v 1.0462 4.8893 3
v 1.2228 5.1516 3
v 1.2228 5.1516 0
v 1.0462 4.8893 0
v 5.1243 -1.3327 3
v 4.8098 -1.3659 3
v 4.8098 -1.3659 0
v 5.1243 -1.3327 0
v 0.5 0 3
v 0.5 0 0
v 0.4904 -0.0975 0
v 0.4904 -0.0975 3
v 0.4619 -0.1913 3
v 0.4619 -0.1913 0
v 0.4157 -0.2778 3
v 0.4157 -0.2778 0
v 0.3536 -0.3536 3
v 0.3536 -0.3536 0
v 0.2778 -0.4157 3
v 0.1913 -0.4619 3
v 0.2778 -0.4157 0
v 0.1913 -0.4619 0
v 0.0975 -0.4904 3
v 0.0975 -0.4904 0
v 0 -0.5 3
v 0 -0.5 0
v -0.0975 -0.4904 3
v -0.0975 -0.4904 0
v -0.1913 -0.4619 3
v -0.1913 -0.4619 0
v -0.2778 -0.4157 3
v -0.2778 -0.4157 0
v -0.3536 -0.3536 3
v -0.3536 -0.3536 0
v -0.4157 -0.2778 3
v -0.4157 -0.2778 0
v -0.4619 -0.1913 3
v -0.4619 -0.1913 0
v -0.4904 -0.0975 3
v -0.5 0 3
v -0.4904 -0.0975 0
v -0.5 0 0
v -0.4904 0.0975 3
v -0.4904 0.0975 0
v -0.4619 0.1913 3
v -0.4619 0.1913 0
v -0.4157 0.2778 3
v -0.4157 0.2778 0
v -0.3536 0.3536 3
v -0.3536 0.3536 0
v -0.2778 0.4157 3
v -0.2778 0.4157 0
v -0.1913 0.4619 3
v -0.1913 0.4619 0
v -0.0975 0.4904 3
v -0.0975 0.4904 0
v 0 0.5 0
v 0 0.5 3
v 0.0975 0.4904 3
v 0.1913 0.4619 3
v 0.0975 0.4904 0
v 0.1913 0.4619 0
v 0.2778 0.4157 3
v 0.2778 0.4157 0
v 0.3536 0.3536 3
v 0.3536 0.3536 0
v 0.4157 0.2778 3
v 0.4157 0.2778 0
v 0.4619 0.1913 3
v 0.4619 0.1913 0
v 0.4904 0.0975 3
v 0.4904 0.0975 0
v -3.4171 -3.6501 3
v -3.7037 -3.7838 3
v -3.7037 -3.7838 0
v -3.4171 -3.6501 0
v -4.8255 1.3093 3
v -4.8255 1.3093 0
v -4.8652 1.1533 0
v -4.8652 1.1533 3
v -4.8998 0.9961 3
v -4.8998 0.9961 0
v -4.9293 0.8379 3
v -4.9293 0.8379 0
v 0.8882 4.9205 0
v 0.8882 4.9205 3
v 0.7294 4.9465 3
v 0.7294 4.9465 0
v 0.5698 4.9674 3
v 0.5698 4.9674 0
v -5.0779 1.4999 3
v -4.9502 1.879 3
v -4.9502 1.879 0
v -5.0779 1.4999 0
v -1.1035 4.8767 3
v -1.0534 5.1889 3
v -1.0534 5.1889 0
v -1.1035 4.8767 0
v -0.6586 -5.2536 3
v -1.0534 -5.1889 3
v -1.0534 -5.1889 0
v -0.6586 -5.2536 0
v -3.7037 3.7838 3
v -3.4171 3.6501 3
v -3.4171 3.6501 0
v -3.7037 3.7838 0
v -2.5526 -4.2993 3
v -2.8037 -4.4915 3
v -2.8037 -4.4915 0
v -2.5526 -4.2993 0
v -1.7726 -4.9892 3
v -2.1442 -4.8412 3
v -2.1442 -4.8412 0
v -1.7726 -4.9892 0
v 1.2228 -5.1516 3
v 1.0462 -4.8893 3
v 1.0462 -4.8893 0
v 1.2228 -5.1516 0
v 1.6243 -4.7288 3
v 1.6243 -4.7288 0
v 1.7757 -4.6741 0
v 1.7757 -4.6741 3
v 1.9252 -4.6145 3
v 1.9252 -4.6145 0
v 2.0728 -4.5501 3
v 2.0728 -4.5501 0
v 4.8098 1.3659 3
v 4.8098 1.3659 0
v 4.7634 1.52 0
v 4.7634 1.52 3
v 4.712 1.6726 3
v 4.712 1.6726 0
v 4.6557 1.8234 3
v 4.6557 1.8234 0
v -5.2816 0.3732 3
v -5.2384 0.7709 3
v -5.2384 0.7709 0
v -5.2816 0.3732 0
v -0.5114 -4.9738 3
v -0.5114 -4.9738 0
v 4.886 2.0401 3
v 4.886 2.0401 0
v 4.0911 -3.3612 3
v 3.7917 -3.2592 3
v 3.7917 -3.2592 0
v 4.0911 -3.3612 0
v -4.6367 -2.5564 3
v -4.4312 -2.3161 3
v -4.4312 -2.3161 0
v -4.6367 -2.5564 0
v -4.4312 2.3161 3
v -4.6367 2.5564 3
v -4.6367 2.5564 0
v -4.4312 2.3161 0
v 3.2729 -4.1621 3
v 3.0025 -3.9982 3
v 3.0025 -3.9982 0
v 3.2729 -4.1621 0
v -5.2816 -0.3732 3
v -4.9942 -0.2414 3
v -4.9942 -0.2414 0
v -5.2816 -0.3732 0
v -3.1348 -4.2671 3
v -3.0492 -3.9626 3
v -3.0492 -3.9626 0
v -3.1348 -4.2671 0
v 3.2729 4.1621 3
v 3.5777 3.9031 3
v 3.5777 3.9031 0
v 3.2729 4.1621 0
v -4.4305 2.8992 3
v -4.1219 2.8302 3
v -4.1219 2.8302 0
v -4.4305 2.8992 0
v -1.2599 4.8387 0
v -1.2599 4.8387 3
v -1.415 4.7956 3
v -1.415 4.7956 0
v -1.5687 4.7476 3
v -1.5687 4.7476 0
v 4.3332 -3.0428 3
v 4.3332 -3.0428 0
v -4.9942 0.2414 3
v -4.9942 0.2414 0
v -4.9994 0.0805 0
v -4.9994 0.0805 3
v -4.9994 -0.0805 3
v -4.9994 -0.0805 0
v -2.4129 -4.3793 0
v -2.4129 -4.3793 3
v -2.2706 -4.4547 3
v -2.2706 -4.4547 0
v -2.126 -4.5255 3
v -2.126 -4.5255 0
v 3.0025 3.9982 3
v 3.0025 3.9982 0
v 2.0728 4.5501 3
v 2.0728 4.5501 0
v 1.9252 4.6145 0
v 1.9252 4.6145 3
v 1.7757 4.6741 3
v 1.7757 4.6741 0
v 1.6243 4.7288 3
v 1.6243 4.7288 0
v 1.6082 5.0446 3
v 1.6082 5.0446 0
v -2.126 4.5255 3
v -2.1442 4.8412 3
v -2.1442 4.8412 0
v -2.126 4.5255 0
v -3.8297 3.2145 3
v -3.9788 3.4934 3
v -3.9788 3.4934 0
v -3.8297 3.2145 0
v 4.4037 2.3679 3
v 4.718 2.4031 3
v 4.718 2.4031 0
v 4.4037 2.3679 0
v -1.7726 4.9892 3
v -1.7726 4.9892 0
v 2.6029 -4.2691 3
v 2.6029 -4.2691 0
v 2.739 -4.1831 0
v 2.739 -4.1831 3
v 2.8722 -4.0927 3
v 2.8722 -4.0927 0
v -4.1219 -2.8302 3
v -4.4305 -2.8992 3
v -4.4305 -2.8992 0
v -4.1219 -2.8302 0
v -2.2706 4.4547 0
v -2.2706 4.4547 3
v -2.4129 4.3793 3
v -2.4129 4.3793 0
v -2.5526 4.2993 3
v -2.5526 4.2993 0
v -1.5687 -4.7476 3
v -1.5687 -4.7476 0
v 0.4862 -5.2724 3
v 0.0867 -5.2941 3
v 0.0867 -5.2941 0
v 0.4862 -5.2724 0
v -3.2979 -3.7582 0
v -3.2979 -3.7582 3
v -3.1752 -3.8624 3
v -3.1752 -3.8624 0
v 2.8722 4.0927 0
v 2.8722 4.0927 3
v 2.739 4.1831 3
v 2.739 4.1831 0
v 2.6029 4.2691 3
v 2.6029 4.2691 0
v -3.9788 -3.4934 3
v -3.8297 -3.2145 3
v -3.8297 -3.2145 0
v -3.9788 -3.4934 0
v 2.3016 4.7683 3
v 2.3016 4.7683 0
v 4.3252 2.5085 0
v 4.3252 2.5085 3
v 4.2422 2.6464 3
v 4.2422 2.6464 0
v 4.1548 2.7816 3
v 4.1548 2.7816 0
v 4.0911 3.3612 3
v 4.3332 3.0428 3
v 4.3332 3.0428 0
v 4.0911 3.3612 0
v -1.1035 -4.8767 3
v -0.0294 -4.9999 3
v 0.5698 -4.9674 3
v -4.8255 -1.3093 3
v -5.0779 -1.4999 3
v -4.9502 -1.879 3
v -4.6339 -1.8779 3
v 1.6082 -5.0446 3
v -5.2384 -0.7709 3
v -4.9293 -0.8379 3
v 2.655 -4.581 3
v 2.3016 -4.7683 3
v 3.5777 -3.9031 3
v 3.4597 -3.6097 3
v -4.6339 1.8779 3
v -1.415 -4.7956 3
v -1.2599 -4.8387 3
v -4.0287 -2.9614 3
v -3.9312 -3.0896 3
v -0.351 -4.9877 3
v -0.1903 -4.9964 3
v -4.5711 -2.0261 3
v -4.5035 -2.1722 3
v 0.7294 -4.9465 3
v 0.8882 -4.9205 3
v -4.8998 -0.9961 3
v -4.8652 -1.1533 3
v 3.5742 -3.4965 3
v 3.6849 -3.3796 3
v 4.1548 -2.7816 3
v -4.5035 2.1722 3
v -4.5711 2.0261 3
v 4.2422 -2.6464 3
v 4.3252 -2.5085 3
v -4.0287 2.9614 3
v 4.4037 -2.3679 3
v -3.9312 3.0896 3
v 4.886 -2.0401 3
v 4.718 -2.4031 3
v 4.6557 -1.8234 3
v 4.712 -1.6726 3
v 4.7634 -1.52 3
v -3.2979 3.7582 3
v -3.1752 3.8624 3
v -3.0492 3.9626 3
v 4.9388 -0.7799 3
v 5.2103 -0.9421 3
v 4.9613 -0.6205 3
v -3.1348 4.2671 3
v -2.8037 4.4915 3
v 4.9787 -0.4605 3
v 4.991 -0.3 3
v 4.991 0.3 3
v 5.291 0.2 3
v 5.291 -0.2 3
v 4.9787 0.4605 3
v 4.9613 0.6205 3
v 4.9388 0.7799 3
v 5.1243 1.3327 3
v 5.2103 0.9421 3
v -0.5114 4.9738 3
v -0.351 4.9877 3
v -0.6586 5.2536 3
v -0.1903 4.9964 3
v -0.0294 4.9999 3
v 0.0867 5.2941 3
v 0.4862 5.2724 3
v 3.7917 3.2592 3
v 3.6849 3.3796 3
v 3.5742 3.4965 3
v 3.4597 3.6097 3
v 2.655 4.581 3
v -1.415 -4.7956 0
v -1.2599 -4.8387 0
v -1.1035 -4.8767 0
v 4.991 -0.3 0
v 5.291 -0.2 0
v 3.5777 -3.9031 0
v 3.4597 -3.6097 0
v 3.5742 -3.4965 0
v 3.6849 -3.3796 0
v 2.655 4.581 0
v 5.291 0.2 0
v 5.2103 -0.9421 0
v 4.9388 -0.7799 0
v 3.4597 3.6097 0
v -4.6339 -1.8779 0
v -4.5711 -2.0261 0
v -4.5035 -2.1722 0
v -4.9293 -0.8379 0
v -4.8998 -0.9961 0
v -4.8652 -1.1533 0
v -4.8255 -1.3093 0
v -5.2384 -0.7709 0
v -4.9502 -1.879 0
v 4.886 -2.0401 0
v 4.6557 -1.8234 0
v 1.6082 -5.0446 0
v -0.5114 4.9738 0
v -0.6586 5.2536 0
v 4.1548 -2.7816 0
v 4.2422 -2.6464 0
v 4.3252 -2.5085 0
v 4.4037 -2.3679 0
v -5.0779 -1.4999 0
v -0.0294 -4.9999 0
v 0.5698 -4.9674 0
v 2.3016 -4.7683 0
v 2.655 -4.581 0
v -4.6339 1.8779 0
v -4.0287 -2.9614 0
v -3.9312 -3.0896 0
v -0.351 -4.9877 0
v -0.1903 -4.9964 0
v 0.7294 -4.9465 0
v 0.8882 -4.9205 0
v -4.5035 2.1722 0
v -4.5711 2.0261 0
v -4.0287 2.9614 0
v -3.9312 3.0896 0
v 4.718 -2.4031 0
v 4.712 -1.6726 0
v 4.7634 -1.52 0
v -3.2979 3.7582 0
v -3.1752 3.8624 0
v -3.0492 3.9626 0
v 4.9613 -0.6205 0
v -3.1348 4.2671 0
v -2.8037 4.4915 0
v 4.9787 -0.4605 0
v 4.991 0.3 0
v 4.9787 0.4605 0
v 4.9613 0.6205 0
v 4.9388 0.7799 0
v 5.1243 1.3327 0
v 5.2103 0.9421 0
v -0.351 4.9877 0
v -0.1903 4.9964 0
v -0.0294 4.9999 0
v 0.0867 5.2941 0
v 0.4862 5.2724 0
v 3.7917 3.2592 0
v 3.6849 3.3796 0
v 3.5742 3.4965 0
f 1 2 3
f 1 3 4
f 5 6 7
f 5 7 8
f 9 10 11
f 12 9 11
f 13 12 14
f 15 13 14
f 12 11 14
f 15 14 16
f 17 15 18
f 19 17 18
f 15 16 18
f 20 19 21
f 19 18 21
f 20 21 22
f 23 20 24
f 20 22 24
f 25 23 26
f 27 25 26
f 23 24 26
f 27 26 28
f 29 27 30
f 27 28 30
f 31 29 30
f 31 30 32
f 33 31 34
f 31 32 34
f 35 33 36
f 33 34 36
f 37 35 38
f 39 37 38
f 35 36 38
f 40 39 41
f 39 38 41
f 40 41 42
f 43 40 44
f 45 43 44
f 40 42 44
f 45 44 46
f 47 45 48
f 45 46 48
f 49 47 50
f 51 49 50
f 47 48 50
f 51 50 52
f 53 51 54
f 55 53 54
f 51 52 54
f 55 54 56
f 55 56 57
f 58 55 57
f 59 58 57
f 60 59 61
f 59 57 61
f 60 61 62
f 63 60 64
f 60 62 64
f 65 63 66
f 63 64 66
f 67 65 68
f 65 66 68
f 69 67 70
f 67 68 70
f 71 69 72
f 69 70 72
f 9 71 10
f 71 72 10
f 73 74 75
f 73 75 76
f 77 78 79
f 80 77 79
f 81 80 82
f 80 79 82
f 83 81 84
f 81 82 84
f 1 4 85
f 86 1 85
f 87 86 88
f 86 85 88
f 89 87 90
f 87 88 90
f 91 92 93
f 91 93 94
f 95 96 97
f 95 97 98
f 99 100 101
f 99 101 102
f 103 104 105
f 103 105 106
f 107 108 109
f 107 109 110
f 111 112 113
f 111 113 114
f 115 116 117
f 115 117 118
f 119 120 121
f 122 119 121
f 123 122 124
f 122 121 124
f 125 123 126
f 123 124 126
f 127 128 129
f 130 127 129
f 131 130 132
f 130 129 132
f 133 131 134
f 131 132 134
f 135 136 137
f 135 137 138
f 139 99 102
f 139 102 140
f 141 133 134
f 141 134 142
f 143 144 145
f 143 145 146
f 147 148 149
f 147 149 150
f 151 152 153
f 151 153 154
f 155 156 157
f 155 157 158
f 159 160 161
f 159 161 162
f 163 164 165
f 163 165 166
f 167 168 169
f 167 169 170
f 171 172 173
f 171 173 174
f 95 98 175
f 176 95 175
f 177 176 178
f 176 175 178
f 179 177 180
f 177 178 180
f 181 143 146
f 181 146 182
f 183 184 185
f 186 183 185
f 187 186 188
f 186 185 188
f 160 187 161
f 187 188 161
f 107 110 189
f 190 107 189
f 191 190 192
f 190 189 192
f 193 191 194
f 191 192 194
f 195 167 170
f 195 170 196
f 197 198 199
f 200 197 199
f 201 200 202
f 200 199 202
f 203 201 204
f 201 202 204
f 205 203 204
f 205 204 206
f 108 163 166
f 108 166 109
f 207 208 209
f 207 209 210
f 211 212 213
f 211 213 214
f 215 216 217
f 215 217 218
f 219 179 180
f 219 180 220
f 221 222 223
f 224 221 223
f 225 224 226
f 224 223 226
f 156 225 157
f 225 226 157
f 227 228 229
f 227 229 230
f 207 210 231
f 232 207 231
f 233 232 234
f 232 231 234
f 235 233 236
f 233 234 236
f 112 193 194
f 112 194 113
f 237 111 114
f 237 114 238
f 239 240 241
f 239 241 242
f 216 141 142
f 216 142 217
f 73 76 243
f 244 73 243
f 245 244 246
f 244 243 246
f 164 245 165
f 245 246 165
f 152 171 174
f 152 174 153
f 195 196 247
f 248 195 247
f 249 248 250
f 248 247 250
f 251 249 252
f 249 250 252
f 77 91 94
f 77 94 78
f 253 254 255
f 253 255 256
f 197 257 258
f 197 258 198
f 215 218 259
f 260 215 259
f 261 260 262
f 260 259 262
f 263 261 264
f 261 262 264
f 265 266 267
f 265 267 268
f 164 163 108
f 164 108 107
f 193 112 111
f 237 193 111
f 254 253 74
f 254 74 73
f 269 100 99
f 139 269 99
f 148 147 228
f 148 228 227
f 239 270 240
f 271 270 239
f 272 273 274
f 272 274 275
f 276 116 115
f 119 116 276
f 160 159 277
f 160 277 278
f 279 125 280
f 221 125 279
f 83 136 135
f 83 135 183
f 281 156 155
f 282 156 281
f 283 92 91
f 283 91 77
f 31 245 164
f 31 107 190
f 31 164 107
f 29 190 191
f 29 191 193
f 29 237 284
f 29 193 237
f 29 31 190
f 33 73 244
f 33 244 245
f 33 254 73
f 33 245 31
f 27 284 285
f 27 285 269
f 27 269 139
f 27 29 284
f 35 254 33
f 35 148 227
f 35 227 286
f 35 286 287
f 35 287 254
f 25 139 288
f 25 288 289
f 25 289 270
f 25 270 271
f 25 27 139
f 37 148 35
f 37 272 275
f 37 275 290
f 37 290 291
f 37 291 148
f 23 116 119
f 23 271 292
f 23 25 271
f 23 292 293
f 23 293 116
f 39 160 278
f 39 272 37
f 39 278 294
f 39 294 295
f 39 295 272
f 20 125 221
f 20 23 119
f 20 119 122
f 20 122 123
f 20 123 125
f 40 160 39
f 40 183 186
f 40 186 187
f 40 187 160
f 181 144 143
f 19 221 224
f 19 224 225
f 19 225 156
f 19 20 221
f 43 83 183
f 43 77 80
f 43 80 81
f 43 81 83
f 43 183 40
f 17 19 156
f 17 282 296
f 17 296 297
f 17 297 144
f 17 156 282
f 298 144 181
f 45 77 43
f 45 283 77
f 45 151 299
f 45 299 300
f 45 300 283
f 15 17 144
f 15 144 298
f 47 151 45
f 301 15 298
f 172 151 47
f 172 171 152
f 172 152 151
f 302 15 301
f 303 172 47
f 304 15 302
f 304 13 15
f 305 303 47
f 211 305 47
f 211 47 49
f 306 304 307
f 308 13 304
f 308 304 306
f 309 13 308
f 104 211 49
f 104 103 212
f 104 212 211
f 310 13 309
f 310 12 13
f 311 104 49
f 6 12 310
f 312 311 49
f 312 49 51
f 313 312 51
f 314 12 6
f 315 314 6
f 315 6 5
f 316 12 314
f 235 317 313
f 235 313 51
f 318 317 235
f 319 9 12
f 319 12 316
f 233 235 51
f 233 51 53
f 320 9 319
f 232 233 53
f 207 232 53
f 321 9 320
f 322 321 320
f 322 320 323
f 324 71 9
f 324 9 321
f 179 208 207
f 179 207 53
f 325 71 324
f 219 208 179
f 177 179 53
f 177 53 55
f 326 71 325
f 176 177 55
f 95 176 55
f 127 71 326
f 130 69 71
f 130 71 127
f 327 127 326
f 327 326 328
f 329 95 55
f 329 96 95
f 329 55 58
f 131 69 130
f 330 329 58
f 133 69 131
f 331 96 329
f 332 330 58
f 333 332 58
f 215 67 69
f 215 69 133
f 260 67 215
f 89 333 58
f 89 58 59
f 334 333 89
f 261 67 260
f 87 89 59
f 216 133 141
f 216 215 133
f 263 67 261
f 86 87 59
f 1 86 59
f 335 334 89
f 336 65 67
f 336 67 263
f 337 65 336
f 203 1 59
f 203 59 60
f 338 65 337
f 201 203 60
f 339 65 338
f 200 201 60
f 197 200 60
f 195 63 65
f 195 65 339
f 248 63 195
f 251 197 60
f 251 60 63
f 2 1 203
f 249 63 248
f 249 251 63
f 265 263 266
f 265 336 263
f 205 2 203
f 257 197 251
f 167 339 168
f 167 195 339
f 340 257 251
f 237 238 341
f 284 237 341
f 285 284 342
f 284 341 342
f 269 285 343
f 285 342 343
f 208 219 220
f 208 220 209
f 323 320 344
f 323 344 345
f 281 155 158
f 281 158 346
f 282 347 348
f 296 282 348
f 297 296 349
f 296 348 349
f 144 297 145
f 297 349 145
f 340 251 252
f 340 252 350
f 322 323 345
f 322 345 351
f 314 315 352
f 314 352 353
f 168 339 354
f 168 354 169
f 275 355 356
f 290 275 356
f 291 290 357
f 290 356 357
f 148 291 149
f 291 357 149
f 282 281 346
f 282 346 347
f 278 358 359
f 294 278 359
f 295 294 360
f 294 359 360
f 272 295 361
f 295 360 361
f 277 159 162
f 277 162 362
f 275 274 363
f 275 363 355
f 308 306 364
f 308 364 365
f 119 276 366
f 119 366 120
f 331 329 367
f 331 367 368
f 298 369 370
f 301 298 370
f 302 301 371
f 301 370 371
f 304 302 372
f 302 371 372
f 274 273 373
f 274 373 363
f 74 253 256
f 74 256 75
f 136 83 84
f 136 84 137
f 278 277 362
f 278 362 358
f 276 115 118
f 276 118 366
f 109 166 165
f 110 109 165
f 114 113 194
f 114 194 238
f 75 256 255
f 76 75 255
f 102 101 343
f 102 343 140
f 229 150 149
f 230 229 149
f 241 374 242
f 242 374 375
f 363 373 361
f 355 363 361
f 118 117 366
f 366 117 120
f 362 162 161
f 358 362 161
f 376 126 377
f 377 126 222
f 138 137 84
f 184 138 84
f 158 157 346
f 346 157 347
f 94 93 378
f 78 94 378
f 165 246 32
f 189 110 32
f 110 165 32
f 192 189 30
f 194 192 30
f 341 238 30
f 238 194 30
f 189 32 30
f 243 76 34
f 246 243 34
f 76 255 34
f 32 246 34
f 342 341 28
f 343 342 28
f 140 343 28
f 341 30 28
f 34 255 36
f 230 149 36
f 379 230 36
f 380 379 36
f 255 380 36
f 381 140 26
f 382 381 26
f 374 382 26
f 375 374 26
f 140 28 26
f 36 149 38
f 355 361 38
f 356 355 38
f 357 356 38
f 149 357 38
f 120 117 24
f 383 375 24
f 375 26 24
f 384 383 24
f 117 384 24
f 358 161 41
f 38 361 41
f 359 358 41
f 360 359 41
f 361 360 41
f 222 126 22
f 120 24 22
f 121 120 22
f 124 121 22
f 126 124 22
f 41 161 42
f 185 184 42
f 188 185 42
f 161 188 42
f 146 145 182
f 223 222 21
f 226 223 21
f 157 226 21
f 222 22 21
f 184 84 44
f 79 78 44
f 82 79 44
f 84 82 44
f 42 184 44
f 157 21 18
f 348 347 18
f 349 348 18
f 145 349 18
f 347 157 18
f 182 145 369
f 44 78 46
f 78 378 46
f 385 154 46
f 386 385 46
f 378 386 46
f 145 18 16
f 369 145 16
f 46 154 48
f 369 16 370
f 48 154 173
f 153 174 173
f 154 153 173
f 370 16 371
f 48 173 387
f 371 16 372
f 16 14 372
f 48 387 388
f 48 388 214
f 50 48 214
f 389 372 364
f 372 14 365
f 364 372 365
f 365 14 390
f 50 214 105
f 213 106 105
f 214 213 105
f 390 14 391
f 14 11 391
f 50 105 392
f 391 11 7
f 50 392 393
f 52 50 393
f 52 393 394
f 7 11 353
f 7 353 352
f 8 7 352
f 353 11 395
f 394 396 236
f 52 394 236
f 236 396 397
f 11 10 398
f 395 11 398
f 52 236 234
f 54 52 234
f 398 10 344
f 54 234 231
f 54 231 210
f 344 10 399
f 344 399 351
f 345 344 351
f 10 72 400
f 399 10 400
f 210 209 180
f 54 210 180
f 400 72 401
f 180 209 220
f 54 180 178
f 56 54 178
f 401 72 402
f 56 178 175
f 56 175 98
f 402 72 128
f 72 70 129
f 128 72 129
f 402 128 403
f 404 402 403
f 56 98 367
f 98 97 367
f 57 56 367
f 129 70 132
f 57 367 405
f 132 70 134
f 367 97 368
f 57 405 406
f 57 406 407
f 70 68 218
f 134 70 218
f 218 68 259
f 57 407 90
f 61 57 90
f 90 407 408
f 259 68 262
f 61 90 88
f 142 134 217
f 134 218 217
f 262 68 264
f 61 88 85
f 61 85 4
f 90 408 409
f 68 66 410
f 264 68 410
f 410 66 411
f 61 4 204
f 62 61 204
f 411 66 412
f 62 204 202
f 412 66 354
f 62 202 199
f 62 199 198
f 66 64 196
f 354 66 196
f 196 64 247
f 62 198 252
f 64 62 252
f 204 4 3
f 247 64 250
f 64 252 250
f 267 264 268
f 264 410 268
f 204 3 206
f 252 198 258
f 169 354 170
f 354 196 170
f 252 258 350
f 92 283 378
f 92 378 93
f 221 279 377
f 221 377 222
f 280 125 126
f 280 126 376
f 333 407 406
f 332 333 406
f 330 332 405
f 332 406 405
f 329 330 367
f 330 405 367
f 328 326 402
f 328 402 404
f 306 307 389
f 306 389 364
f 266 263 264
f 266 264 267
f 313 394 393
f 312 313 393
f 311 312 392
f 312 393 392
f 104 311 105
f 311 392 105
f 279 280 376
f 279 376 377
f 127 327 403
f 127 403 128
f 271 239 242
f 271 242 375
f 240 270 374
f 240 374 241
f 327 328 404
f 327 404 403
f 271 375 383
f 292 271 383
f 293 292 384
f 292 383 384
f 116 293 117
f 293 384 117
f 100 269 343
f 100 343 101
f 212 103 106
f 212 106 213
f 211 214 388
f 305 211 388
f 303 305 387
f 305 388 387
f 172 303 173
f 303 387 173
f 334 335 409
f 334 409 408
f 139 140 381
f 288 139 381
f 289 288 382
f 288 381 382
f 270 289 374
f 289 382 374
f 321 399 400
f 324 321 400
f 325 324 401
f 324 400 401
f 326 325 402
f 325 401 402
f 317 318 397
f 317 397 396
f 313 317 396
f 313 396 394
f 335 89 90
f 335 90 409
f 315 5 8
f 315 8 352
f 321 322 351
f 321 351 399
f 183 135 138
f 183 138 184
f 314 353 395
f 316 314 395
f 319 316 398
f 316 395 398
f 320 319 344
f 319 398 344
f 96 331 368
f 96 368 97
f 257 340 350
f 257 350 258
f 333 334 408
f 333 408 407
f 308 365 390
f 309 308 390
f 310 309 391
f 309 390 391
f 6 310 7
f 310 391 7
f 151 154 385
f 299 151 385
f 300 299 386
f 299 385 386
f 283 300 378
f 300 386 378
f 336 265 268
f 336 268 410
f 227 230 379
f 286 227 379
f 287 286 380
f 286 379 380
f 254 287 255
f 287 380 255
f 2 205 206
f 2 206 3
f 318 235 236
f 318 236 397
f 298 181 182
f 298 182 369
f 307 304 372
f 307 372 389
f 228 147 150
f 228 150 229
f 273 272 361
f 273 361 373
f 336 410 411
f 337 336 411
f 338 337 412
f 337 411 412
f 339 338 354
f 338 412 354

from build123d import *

# Parameters (mm, degrees)
F3_R      = 5
F4_DEPTH  = 3
F8_DEPTH  = 3
F9_COUNT  = 29
F10_R     = 0.5
F11_DEPTH = 3


with BuildPart() as f4:
    # F3 (on Top) → F4 (new body)
    with BuildSketch(Plane.XY):
        Circle(F3_R)
    extrude(amount=F4_DEPTH)

    # F5 (on face) → F8 (join)
    with BuildSketch(Plane.XY.offset(3)):
        Polygon((5.2909918854, -0.2), (5.2909918854, 0.2), (4.9909918854, 0.3), (4.8909918854, 0.3), (4.8909918854, -0.3), (4.9909918854, -0.3), align=None)
    extrude(amount=-F8_DEPTH)

    # F9: F4 ×29 about axis
    f9_axis = Axis((0, 0, 0), (0, 0, -1))


with BuildPart() as f4_1:
    add(f4.part)
    for i in range(1, F9_COUNT):
        add(f4.part.rotate(f9_axis, i * 360 / F9_COUNT))

    # F10 (on face) → F11 (cut, through all)
    with BuildSketch(Plane(origin=(0, 0, 0), x_dir=(1, 0, 0), z_dir=(0, 0, -1))):
        Circle(F10_R)
    extrude(amount=-F11_DEPTH, mode=Mode.SUBTRACT)


solid = f4_1.part
